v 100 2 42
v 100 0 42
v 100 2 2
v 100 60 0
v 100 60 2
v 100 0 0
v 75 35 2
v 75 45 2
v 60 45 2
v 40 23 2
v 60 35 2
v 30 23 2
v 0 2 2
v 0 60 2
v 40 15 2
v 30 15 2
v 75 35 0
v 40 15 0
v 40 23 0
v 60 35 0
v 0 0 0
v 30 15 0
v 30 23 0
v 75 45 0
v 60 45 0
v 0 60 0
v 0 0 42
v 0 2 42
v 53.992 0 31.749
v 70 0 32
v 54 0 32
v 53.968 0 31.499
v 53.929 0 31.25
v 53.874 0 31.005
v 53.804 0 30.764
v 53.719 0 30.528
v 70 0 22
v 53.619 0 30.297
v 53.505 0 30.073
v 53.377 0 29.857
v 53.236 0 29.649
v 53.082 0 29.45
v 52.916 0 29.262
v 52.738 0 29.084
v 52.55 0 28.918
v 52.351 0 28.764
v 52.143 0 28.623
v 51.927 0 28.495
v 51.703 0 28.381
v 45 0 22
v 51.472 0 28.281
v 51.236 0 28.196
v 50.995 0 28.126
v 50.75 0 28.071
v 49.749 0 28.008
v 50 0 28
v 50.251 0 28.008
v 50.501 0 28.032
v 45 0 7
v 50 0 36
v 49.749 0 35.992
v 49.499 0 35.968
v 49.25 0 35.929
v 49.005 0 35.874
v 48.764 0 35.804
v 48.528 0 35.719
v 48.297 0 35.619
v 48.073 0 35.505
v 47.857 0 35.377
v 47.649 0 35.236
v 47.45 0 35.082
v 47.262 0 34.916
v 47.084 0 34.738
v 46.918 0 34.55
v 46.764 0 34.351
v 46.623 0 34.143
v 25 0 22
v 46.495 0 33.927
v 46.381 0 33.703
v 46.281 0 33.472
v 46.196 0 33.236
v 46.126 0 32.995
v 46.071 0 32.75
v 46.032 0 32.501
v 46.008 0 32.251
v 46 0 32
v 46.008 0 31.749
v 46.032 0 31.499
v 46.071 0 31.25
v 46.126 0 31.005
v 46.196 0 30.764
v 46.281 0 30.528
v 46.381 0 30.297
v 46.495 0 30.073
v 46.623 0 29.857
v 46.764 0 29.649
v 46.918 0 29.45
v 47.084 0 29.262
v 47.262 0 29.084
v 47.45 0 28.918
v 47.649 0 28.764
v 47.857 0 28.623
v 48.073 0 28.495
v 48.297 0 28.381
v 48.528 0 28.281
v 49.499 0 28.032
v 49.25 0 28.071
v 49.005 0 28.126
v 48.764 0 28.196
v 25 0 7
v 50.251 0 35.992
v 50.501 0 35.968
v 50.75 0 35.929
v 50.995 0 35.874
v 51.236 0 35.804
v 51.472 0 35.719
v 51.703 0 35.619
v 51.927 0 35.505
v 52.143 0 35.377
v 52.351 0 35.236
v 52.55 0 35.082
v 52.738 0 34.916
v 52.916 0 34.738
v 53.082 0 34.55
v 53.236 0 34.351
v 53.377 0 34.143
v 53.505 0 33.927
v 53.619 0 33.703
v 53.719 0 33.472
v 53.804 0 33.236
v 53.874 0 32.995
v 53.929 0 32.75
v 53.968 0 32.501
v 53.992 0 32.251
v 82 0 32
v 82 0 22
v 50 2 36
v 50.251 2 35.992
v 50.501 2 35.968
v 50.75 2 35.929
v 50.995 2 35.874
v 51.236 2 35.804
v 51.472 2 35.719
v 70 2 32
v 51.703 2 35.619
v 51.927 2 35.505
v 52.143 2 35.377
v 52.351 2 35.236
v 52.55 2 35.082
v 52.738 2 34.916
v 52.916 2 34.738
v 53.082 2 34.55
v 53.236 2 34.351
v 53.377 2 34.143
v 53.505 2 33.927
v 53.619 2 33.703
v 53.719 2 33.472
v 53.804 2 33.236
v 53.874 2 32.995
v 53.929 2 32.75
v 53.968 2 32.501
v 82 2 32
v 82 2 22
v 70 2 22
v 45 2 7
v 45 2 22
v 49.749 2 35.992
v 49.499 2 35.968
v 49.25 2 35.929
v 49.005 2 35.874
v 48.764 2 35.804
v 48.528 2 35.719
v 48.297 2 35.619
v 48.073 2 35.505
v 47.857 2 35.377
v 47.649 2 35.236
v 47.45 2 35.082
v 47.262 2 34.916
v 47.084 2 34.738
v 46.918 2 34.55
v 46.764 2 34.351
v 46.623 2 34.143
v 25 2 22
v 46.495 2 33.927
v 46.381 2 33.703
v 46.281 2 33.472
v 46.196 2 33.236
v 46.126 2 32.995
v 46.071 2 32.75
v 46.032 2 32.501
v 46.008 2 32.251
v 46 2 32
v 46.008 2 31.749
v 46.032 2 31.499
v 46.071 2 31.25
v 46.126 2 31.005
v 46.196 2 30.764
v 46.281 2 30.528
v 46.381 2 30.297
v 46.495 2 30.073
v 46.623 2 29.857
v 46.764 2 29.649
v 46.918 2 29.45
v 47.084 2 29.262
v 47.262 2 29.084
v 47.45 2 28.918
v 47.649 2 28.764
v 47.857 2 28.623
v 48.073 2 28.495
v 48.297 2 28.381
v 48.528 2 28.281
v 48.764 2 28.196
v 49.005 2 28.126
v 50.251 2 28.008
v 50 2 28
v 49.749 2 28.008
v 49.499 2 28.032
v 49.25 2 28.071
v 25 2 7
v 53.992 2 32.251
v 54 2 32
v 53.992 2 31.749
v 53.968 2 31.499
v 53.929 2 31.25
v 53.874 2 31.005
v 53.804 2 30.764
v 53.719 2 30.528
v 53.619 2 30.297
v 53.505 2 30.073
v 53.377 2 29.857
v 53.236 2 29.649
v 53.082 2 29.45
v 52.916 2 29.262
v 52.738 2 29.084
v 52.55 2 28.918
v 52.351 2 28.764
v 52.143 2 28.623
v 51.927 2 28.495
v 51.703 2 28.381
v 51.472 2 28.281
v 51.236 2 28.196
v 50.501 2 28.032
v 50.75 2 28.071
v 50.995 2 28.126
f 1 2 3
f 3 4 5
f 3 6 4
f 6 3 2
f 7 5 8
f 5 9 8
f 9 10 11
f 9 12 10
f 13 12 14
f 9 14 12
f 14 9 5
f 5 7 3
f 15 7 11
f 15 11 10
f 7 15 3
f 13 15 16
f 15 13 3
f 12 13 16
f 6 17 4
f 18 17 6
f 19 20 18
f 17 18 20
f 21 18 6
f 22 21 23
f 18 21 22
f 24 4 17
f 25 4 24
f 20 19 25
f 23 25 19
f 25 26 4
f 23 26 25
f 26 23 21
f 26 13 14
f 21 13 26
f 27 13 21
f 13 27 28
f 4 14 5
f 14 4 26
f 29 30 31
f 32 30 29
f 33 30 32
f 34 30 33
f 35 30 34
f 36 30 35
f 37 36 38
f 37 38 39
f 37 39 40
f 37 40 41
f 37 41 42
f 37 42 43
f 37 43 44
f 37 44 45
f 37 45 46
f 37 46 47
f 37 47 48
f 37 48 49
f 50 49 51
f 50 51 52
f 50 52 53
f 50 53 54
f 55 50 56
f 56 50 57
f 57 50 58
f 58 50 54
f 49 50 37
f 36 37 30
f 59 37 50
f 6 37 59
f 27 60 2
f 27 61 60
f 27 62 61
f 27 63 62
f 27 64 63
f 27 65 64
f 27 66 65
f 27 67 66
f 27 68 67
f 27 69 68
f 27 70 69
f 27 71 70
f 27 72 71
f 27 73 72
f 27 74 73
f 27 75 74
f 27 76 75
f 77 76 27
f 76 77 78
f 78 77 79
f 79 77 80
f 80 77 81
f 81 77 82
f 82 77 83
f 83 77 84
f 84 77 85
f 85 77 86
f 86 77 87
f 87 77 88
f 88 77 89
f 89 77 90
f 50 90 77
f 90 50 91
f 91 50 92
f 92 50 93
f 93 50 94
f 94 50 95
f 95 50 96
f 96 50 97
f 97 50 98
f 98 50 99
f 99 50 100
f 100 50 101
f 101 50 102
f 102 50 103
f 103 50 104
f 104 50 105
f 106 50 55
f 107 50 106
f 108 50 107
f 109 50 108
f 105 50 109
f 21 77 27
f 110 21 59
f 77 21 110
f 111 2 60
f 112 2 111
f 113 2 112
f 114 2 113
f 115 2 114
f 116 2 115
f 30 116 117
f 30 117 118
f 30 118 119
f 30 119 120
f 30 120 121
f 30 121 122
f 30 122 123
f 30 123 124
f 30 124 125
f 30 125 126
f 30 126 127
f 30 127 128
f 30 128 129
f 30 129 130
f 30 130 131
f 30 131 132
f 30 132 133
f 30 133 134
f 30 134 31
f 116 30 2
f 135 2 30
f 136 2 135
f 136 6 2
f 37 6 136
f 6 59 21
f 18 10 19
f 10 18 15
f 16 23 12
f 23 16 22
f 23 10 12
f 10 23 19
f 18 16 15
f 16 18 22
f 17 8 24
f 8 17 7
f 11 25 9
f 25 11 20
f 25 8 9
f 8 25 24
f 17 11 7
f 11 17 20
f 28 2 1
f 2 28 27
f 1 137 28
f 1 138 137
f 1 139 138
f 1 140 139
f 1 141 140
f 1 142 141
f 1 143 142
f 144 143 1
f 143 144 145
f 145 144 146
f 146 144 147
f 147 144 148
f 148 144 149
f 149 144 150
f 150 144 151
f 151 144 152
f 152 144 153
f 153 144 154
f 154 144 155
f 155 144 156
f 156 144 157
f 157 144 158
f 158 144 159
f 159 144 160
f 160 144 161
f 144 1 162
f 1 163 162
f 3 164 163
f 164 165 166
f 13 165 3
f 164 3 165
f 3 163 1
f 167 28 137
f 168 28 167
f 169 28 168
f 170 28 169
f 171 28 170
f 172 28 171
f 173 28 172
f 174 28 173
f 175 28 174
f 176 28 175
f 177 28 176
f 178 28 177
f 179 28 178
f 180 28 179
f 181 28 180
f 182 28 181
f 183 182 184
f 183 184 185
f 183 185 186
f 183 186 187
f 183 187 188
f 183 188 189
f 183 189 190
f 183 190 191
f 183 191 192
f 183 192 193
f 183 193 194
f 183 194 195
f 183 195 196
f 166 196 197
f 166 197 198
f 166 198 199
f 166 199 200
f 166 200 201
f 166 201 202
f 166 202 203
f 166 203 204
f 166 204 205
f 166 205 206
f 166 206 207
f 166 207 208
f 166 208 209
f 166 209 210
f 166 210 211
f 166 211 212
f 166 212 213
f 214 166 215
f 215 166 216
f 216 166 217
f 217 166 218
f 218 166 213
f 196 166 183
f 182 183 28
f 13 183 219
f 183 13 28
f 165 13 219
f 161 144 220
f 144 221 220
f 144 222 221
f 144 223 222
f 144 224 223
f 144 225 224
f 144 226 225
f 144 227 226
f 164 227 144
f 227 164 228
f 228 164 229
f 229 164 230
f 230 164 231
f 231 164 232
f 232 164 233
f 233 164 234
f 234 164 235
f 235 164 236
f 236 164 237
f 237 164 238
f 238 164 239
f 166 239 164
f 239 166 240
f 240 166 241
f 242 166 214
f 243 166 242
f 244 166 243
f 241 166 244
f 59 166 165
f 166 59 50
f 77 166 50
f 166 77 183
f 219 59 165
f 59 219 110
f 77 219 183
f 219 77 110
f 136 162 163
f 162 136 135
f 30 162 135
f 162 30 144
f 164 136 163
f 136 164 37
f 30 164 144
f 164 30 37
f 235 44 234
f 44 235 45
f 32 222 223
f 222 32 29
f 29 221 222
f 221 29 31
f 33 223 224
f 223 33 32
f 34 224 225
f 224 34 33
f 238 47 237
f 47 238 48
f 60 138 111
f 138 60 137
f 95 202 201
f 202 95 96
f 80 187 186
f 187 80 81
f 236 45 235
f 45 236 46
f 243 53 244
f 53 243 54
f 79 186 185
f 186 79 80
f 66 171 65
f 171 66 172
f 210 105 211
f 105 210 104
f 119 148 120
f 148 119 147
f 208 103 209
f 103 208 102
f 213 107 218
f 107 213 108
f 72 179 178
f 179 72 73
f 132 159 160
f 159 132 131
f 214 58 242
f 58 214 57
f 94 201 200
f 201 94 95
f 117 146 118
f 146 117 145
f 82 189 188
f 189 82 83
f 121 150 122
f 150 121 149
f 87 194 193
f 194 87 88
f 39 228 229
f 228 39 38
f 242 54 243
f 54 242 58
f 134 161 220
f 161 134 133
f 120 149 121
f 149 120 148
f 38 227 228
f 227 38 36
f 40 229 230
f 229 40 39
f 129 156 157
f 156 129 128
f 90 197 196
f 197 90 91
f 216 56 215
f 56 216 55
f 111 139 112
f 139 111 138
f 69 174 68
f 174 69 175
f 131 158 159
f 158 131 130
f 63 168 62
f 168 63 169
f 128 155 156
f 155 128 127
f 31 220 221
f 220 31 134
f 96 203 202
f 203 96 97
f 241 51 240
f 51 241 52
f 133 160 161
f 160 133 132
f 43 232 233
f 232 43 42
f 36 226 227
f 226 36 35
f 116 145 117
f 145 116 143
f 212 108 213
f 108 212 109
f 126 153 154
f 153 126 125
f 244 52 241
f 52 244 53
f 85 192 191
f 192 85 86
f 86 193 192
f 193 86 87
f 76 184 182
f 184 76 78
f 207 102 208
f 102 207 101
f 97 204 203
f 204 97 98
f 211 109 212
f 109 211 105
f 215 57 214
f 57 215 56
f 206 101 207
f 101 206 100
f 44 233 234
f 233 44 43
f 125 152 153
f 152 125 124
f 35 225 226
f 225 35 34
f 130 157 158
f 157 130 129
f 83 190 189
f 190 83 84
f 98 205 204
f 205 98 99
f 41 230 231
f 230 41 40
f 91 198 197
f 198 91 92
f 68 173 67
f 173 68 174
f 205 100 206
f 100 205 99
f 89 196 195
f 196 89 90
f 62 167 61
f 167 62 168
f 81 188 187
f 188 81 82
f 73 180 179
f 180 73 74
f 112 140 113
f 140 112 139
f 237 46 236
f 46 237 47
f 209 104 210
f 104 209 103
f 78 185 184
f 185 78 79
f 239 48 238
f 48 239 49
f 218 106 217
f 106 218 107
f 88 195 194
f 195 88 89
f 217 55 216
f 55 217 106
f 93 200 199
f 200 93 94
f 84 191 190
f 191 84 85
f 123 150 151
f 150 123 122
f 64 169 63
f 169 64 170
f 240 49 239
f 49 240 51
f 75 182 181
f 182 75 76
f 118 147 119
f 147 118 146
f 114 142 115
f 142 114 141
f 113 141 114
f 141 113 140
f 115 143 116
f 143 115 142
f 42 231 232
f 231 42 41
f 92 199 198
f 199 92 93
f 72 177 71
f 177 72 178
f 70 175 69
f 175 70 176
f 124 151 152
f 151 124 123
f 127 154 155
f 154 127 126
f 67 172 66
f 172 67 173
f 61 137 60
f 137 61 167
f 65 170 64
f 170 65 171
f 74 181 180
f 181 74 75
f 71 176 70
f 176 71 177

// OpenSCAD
// Parameters
base_length = 100;
base_width = 60;
base_thickness = 2;

wall_height = 40;
wall_thickness = 2;
wall_position = 0; // Along y=0 edge

// Base sheet rectangular cuts (through material)
base_cut1 = [30, 15, 10, 8]; // [x, y, width, height]
base_cut2 = [60, 35, 15, 10];

// Wall rectangular openings (through wall thickness)
wall_opening1 = [25, 5, 20, 15]; // [x, z_from_base, width, height]
wall_opening2 = [70, 20, 12, 10];

// Wall round through-hole
hole_x = 50;
hole_z = 30;
hole_radius = 4;

$fn = 100;

// Base sheet with cuts
module base_with_cuts() {
    difference() {
        // Main base sheet
        cube([base_length, base_width, base_thickness]);
        
        // Subtract rectangular cuts
        translate([base_cut1[0], base_cut1[1], -0.1])
            cube([base_cut1[2], base_cut1[3], base_thickness + 0.2]);
        translate([base_cut2[0], base_cut2[1], -0.1])
            cube([base_cut2[2], base_cut2[3], base_thickness + 0.2]);
    }
}

// Wall with openings and hole
module wall_with_features() {
    difference() {
        // Main wall
        translate([0, wall_position, base_thickness])
            cube([base_length, wall_thickness, wall_height]);
        
        // Subtract lower rectangular opening
        translate([wall_opening1[0], wall_position - 0.1, base_thickness + wall_opening1[1]])
            cube([wall_opening1[2], wall_thickness + 0.2, wall_opening1[3]]);
        
        // Subtract upper rectangular opening
        translate([wall_opening2[0], wall_position - 0.1, base_thickness + wall_opening2[1]])
            cube([wall_opening2[2], wall_thickness + 0.2, wall_opening2[3]]);
        
        // Subtract round through-hole
        translate([hole_x, wall_position - 0.1, base_thickness + hole_z])
            rotate([-90, 0, 0])
                cylinder(h = wall_thickness + 0.2, r = hole_radius);
    }
}

// Main assembly
union() {
    base_with_cuts();
    wall_with_features();
}
